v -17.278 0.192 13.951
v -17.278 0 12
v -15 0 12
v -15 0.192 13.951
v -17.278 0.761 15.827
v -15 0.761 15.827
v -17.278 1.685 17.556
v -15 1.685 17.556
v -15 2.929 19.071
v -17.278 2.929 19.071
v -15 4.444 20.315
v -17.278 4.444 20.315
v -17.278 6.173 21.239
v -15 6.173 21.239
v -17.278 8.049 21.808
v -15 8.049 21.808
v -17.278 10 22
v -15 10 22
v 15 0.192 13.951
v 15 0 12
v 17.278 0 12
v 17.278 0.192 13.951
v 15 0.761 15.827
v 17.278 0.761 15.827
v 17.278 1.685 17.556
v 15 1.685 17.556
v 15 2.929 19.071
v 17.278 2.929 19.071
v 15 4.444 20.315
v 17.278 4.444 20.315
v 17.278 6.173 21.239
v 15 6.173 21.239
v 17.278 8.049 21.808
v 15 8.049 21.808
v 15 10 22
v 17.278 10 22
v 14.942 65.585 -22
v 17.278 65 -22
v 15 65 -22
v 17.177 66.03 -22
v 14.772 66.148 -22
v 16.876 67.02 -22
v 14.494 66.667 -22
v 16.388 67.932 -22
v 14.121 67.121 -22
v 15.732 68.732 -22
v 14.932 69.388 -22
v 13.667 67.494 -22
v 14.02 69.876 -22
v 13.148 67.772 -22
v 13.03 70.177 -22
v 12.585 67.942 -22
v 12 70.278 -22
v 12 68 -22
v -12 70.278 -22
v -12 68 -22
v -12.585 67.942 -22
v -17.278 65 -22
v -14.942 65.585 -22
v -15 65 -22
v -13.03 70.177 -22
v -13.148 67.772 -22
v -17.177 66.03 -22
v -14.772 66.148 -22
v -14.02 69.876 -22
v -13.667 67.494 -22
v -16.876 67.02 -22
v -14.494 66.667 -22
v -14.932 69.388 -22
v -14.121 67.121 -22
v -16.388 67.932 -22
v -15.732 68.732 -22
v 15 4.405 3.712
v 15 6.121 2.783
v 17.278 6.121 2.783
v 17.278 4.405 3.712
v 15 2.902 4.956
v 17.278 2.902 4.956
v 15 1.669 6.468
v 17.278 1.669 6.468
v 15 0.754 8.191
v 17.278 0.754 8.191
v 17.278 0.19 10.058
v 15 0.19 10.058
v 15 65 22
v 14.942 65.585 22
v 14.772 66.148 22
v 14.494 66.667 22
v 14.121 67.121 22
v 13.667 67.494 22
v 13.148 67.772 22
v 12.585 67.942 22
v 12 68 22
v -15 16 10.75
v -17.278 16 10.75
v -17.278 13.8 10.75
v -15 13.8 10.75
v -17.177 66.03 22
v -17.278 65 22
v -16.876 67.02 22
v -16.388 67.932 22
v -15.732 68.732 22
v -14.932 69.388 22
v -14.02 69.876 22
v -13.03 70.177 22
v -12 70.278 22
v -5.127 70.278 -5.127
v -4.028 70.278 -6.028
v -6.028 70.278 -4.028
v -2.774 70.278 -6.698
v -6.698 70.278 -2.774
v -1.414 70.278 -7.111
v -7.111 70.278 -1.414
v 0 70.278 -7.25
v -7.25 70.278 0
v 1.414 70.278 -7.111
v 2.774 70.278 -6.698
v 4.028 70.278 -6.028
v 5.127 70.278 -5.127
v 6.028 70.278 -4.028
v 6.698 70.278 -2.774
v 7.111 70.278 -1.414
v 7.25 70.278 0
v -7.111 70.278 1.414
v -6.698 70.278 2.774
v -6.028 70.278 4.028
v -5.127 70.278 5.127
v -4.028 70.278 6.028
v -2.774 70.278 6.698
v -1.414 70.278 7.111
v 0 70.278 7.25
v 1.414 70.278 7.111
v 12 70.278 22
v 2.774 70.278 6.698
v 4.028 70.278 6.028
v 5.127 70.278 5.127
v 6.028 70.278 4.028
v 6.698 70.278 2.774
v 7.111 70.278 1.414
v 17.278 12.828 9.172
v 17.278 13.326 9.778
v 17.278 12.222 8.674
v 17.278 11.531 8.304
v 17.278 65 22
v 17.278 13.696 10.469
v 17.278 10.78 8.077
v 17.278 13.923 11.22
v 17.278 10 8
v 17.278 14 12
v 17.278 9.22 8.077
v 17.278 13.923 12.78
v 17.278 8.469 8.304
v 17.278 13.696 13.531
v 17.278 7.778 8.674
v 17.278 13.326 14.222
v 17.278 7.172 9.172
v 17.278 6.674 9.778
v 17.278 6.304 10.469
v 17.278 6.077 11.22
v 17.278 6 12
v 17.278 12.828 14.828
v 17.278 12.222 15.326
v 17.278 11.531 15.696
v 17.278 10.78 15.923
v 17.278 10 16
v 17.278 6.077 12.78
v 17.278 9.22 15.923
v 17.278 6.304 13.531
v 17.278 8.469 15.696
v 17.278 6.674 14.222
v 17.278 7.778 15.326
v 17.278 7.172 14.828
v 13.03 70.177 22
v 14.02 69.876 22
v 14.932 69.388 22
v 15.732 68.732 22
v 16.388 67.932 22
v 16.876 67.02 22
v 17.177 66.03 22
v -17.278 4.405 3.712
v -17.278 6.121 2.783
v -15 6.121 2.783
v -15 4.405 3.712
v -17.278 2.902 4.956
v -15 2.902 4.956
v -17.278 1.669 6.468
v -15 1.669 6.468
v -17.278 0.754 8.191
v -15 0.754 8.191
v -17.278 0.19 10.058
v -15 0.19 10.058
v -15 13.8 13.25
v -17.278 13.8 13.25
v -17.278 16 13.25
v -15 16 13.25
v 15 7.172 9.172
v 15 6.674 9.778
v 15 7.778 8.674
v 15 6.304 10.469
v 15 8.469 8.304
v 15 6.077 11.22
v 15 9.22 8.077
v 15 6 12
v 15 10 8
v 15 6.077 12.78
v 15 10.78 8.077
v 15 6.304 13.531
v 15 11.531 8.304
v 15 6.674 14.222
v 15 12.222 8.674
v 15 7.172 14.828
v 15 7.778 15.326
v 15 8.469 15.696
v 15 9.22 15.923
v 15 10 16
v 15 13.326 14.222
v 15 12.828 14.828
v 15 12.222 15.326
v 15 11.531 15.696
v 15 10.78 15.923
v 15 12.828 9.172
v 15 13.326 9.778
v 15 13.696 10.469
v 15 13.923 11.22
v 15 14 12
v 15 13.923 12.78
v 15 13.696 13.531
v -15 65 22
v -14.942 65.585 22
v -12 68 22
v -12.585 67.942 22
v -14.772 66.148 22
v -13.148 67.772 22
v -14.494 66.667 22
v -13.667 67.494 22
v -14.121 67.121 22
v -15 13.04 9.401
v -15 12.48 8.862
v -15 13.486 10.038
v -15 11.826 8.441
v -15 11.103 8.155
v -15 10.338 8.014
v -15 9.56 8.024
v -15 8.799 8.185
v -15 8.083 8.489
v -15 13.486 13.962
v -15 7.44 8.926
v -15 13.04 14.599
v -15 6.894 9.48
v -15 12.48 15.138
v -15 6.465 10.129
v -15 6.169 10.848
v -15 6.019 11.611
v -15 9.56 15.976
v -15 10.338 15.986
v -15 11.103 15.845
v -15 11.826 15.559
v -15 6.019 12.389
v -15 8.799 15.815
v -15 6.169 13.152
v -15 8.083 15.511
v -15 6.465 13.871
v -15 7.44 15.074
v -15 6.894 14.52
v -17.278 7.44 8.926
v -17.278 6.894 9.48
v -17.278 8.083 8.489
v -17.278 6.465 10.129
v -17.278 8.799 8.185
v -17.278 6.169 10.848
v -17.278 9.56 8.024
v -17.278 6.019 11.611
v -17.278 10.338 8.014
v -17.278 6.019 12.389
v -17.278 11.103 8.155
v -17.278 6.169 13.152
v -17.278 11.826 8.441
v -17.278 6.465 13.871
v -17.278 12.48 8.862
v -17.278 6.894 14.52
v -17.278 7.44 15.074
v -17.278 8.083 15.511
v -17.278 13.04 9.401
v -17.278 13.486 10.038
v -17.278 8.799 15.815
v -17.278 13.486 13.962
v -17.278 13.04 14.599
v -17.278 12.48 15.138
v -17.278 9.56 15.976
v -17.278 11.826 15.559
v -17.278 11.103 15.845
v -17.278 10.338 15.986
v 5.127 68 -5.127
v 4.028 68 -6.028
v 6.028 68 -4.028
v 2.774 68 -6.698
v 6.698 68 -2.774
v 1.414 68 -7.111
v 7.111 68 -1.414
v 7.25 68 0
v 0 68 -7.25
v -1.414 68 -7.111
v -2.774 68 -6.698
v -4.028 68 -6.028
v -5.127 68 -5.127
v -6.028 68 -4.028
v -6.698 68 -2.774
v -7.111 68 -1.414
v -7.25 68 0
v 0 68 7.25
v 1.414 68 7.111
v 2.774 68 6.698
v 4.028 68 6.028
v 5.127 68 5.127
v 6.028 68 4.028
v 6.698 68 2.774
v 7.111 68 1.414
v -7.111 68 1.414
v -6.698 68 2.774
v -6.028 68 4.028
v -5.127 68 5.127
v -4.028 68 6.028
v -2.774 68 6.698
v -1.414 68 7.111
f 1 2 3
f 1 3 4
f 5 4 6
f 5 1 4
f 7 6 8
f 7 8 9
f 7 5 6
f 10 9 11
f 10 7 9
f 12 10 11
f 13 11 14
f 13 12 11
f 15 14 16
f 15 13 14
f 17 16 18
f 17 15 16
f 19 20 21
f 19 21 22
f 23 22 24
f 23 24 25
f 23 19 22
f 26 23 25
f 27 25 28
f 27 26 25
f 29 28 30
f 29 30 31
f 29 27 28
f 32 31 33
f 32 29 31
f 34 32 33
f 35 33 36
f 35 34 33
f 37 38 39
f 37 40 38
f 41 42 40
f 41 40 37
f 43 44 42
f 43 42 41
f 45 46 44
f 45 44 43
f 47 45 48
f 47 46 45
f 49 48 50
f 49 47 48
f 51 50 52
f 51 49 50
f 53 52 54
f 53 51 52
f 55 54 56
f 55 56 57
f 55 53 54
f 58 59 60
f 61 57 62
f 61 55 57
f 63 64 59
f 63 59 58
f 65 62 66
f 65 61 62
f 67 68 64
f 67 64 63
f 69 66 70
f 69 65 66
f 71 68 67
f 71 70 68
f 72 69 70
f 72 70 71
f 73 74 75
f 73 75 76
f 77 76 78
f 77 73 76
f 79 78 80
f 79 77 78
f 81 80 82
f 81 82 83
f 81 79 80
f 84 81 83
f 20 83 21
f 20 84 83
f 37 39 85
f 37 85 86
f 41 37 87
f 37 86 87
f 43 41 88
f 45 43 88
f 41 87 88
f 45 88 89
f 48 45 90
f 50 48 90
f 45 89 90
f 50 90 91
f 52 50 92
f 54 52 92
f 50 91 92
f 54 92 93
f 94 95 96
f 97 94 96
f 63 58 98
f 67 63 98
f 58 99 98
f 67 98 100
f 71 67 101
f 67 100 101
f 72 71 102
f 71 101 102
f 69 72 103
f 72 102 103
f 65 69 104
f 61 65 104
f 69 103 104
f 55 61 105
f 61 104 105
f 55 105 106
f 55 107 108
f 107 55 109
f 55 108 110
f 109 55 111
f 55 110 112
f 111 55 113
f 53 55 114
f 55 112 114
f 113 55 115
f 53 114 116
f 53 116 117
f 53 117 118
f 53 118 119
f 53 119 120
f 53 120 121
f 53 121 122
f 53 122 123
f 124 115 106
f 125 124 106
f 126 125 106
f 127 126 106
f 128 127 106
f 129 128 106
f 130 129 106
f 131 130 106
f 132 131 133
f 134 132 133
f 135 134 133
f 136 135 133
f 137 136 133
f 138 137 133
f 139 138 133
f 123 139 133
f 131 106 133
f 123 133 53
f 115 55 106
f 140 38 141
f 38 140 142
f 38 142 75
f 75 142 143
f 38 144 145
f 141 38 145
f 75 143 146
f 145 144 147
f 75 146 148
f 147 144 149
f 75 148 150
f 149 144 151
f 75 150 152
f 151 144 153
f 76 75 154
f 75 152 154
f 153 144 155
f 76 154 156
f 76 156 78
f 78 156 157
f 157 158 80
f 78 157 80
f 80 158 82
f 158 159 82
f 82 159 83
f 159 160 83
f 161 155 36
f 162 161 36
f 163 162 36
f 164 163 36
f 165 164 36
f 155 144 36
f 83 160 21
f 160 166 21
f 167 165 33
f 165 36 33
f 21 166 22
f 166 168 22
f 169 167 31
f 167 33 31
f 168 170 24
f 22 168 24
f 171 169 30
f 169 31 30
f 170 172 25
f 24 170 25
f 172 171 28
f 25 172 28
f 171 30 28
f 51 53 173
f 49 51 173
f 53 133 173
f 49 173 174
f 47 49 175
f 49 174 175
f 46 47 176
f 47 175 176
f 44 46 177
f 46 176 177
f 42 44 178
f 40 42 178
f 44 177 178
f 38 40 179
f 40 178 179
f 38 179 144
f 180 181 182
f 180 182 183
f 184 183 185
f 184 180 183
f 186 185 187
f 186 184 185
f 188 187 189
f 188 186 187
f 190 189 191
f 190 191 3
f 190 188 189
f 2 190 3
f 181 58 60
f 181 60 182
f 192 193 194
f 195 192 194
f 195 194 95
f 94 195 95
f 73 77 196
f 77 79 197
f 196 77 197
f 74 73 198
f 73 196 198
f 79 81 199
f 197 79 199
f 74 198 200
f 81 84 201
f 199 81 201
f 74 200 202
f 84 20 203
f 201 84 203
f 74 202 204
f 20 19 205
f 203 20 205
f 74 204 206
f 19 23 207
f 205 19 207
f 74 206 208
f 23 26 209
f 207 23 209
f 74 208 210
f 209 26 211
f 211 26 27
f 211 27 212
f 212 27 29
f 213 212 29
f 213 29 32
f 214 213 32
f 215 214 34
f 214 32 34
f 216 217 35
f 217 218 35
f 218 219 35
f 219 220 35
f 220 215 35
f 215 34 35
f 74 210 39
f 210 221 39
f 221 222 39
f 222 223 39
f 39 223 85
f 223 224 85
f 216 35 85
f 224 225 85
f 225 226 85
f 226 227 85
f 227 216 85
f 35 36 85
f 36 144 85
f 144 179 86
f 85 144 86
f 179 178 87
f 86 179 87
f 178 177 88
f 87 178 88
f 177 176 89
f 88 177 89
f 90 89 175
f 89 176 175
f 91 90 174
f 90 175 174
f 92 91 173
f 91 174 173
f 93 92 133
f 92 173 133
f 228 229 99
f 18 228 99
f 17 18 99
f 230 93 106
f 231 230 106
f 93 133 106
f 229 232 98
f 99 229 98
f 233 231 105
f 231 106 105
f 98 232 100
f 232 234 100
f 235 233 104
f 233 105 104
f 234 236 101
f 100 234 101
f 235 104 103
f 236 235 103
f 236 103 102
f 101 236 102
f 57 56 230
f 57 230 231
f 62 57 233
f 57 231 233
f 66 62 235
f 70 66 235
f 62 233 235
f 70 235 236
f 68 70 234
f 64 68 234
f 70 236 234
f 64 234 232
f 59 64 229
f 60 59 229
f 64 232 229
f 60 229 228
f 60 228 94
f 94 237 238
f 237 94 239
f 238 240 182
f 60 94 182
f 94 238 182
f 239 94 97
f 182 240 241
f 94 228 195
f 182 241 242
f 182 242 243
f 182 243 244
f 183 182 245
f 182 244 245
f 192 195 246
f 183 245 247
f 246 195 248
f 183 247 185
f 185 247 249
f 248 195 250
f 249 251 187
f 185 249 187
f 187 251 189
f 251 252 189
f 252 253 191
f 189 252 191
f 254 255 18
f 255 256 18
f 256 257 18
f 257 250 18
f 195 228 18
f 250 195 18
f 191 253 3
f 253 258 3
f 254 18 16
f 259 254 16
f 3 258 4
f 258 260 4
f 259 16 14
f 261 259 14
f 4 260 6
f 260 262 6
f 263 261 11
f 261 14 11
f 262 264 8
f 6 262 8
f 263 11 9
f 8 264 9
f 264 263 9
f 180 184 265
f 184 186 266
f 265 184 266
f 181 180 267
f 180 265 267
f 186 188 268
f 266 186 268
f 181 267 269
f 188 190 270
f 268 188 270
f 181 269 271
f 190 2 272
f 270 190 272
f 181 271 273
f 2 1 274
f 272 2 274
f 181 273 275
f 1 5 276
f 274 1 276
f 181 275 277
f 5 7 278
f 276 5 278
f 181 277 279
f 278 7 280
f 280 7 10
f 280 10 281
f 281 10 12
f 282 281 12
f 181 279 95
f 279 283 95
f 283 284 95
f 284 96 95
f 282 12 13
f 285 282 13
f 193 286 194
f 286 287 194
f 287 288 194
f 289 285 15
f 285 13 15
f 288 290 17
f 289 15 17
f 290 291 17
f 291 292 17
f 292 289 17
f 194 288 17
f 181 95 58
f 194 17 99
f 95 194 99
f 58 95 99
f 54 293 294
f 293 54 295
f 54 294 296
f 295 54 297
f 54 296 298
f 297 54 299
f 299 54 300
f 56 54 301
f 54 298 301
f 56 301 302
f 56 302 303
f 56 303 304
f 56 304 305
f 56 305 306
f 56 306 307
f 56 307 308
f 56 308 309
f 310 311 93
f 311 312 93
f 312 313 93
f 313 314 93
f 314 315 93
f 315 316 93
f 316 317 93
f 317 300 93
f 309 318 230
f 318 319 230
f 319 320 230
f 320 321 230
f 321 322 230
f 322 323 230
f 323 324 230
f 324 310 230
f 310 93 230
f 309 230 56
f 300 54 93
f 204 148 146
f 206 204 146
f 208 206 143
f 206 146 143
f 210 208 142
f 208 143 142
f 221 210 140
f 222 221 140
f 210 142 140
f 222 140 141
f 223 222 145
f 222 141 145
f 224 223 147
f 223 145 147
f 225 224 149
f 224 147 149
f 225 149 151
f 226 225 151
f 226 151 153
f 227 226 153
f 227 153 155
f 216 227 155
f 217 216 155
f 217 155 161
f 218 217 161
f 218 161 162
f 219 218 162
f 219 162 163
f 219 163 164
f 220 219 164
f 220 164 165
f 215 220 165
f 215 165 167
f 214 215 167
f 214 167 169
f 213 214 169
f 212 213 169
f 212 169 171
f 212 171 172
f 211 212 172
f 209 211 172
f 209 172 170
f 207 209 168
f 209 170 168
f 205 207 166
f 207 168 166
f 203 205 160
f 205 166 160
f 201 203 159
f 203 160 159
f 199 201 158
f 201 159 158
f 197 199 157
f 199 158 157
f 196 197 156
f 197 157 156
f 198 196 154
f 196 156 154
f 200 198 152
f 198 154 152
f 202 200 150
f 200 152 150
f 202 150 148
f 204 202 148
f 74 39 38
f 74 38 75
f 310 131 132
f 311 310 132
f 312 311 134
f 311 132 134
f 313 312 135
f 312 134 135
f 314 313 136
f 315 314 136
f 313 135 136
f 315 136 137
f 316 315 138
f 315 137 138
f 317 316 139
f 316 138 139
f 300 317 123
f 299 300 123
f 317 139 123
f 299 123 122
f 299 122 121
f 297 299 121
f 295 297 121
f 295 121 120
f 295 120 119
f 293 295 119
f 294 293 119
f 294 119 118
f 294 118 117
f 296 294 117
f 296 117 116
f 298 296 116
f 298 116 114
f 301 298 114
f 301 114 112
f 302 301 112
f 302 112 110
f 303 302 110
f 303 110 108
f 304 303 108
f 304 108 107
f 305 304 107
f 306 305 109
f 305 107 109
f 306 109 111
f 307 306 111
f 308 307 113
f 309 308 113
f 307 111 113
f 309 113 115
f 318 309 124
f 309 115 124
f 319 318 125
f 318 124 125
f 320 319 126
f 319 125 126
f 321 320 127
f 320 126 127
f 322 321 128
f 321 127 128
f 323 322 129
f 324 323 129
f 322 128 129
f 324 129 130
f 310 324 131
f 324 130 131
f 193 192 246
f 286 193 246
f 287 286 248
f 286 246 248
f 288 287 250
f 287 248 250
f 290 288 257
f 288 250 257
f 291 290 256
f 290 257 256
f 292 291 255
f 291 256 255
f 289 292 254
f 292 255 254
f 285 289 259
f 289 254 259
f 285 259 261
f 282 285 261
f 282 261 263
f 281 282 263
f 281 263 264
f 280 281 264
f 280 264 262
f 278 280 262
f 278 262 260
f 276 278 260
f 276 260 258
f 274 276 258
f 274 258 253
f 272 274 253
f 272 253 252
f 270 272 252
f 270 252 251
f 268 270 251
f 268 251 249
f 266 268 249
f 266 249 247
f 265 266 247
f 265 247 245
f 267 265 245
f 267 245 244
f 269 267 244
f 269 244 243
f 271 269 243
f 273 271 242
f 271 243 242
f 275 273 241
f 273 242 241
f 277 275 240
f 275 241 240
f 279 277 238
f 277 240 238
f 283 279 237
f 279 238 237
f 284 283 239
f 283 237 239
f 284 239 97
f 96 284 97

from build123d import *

# Parameters (mm, degrees)
BASE_FLANGE1_DEPTH = 22
CUT_EXTRUDE2_START = -34.556
CUT_EXTRUDE2_DEPTH = 34.556
SKETCH9_R          = 4
CUT_EXTRUDE3_DEPTH = 82.345647825
SKETCH10_R         = 7.25
CUT_EXTRUDE4_DEPTH = 76.640773185
CUT_EXTRUDE5_REACH = 83.346


# Read off the part's stored shape, not the designer's step: Cut-Extrude2
# Sheet-metal steps are written as plain solids
with BuildPart() as part:
    # Sketch2 → Base-Flange1 (new, symmetric)
    with BuildSketch(Plane.XY):
        with BuildLine():
            Line((15, 0), (15, 65))
            ThreePointArc((15, 65), (14.121320344, 67.121320344), (12, 68))
            Line((12, 68), (-12, 68))
            ThreePointArc((-12, 68), (-14.121320344, 67.121320344), (-15, 65))
            Line((-15, 65), (-15, 0))
            Line((-15, 0), (-17.278, 0))
            Line((-17.278, 0), (-17.278, 65))
            ThreePointArc((-17.278, 65), (-15.732109591, 68.732109591), (-12, 70.278))
            Line((-12, 70.278), (12, 70.278))
            ThreePointArc((12, 70.278), (15.732109591, 68.732109591), (17.278, 65))
            Line((17.278, 65), (17.278, 0))
            Line((17.278, 0), (15, 0))
        make_face()
    extrude(amount=BASE_FLANGE1_DEPTH, both=True)

    # Cut-Extrude2 outline → Cut-Extrude2 (cut)
    with BuildSketch(Plane(origin=(17.278, 0, 0), x_dir=(0, 0, -1), z_dir=(1, 0, 0)).offset(CUT_EXTRUDE2_START)):
        with BuildLine():
            Line((22, 65), (-2.783188769, 6.120516693))
            ThreePointArc((-2.783188769, 6.120516693), (-6.468039819, 1.669488818), (-12.000000004, 0))
            Line((-12.000000004, 0), (22, 0))
            Line((22, 0), (22, 65))
        make_face()
        with BuildLine():
            Line((-22, 0), (-12.000000004, 0))
            ThreePointArc((-12.000000004, 0), (-19.071067813, 2.92893219), (-22, 10))
            Line((-22, 10), (-22, 0))
        make_face()
    extrude(amount=CUT_EXTRUDE2_DEPTH, mode=Mode.SUBTRACT)

    # Sketch9 → Cut-Extrude3 (cut, through all)
    with BuildSketch(Plane(origin=(17.278, 0, 0), x_dir=(0, 0, -1), z_dir=(1, 0, 0))):
        with Locations((-12, 10)):
            Circle(SKETCH9_R)
    extrude(amount=-CUT_EXTRUDE3_DEPTH, mode=Mode.SUBTRACT)

    # Sketch10 → Cut-Extrude4 (cut, through all)
    with BuildSketch(Plane(origin=(0, 70.278, 0), x_dir=(1, 0, 0), z_dir=(0, 1, 0))):
        with Locations(Location((0, 0, 0), (0, 0, 270))):
            Circle(SKETCH10_R)
    extrude(amount=-CUT_EXTRUDE4_DEPTH, mode=Mode.SUBTRACT)

    # Sketch13 → Cut-Extrude5 (cut, up to next)
    with BuildSketch(Plane.ZY.offset(17.278), mode=Mode.PRIVATE) as cut_extrude5_sk1:
        with BuildLine():
            ThreePointArc((10.75, 13.799671038), (12, 14), (13.25, 13.799671038))
            Line((13.25, 13.799671038), (13.25, 16))
            Line((13.25, 16), (10.75, 16))
            Line((10.75, 16), (10.75, 13.799671038))
        make_face()
    cut_extrude5_tool1 = extrude(cut_extrude5_sk1.sketch, amount=-CUT_EXTRUDE5_REACH, mode=Mode.PRIVATE) & part.part
    add(cut_extrude5_tool1.solids().sort_by_distance((-17.278, 14.966097, 12))[0], mode=Mode.SUBTRACT)


solid = part.part
